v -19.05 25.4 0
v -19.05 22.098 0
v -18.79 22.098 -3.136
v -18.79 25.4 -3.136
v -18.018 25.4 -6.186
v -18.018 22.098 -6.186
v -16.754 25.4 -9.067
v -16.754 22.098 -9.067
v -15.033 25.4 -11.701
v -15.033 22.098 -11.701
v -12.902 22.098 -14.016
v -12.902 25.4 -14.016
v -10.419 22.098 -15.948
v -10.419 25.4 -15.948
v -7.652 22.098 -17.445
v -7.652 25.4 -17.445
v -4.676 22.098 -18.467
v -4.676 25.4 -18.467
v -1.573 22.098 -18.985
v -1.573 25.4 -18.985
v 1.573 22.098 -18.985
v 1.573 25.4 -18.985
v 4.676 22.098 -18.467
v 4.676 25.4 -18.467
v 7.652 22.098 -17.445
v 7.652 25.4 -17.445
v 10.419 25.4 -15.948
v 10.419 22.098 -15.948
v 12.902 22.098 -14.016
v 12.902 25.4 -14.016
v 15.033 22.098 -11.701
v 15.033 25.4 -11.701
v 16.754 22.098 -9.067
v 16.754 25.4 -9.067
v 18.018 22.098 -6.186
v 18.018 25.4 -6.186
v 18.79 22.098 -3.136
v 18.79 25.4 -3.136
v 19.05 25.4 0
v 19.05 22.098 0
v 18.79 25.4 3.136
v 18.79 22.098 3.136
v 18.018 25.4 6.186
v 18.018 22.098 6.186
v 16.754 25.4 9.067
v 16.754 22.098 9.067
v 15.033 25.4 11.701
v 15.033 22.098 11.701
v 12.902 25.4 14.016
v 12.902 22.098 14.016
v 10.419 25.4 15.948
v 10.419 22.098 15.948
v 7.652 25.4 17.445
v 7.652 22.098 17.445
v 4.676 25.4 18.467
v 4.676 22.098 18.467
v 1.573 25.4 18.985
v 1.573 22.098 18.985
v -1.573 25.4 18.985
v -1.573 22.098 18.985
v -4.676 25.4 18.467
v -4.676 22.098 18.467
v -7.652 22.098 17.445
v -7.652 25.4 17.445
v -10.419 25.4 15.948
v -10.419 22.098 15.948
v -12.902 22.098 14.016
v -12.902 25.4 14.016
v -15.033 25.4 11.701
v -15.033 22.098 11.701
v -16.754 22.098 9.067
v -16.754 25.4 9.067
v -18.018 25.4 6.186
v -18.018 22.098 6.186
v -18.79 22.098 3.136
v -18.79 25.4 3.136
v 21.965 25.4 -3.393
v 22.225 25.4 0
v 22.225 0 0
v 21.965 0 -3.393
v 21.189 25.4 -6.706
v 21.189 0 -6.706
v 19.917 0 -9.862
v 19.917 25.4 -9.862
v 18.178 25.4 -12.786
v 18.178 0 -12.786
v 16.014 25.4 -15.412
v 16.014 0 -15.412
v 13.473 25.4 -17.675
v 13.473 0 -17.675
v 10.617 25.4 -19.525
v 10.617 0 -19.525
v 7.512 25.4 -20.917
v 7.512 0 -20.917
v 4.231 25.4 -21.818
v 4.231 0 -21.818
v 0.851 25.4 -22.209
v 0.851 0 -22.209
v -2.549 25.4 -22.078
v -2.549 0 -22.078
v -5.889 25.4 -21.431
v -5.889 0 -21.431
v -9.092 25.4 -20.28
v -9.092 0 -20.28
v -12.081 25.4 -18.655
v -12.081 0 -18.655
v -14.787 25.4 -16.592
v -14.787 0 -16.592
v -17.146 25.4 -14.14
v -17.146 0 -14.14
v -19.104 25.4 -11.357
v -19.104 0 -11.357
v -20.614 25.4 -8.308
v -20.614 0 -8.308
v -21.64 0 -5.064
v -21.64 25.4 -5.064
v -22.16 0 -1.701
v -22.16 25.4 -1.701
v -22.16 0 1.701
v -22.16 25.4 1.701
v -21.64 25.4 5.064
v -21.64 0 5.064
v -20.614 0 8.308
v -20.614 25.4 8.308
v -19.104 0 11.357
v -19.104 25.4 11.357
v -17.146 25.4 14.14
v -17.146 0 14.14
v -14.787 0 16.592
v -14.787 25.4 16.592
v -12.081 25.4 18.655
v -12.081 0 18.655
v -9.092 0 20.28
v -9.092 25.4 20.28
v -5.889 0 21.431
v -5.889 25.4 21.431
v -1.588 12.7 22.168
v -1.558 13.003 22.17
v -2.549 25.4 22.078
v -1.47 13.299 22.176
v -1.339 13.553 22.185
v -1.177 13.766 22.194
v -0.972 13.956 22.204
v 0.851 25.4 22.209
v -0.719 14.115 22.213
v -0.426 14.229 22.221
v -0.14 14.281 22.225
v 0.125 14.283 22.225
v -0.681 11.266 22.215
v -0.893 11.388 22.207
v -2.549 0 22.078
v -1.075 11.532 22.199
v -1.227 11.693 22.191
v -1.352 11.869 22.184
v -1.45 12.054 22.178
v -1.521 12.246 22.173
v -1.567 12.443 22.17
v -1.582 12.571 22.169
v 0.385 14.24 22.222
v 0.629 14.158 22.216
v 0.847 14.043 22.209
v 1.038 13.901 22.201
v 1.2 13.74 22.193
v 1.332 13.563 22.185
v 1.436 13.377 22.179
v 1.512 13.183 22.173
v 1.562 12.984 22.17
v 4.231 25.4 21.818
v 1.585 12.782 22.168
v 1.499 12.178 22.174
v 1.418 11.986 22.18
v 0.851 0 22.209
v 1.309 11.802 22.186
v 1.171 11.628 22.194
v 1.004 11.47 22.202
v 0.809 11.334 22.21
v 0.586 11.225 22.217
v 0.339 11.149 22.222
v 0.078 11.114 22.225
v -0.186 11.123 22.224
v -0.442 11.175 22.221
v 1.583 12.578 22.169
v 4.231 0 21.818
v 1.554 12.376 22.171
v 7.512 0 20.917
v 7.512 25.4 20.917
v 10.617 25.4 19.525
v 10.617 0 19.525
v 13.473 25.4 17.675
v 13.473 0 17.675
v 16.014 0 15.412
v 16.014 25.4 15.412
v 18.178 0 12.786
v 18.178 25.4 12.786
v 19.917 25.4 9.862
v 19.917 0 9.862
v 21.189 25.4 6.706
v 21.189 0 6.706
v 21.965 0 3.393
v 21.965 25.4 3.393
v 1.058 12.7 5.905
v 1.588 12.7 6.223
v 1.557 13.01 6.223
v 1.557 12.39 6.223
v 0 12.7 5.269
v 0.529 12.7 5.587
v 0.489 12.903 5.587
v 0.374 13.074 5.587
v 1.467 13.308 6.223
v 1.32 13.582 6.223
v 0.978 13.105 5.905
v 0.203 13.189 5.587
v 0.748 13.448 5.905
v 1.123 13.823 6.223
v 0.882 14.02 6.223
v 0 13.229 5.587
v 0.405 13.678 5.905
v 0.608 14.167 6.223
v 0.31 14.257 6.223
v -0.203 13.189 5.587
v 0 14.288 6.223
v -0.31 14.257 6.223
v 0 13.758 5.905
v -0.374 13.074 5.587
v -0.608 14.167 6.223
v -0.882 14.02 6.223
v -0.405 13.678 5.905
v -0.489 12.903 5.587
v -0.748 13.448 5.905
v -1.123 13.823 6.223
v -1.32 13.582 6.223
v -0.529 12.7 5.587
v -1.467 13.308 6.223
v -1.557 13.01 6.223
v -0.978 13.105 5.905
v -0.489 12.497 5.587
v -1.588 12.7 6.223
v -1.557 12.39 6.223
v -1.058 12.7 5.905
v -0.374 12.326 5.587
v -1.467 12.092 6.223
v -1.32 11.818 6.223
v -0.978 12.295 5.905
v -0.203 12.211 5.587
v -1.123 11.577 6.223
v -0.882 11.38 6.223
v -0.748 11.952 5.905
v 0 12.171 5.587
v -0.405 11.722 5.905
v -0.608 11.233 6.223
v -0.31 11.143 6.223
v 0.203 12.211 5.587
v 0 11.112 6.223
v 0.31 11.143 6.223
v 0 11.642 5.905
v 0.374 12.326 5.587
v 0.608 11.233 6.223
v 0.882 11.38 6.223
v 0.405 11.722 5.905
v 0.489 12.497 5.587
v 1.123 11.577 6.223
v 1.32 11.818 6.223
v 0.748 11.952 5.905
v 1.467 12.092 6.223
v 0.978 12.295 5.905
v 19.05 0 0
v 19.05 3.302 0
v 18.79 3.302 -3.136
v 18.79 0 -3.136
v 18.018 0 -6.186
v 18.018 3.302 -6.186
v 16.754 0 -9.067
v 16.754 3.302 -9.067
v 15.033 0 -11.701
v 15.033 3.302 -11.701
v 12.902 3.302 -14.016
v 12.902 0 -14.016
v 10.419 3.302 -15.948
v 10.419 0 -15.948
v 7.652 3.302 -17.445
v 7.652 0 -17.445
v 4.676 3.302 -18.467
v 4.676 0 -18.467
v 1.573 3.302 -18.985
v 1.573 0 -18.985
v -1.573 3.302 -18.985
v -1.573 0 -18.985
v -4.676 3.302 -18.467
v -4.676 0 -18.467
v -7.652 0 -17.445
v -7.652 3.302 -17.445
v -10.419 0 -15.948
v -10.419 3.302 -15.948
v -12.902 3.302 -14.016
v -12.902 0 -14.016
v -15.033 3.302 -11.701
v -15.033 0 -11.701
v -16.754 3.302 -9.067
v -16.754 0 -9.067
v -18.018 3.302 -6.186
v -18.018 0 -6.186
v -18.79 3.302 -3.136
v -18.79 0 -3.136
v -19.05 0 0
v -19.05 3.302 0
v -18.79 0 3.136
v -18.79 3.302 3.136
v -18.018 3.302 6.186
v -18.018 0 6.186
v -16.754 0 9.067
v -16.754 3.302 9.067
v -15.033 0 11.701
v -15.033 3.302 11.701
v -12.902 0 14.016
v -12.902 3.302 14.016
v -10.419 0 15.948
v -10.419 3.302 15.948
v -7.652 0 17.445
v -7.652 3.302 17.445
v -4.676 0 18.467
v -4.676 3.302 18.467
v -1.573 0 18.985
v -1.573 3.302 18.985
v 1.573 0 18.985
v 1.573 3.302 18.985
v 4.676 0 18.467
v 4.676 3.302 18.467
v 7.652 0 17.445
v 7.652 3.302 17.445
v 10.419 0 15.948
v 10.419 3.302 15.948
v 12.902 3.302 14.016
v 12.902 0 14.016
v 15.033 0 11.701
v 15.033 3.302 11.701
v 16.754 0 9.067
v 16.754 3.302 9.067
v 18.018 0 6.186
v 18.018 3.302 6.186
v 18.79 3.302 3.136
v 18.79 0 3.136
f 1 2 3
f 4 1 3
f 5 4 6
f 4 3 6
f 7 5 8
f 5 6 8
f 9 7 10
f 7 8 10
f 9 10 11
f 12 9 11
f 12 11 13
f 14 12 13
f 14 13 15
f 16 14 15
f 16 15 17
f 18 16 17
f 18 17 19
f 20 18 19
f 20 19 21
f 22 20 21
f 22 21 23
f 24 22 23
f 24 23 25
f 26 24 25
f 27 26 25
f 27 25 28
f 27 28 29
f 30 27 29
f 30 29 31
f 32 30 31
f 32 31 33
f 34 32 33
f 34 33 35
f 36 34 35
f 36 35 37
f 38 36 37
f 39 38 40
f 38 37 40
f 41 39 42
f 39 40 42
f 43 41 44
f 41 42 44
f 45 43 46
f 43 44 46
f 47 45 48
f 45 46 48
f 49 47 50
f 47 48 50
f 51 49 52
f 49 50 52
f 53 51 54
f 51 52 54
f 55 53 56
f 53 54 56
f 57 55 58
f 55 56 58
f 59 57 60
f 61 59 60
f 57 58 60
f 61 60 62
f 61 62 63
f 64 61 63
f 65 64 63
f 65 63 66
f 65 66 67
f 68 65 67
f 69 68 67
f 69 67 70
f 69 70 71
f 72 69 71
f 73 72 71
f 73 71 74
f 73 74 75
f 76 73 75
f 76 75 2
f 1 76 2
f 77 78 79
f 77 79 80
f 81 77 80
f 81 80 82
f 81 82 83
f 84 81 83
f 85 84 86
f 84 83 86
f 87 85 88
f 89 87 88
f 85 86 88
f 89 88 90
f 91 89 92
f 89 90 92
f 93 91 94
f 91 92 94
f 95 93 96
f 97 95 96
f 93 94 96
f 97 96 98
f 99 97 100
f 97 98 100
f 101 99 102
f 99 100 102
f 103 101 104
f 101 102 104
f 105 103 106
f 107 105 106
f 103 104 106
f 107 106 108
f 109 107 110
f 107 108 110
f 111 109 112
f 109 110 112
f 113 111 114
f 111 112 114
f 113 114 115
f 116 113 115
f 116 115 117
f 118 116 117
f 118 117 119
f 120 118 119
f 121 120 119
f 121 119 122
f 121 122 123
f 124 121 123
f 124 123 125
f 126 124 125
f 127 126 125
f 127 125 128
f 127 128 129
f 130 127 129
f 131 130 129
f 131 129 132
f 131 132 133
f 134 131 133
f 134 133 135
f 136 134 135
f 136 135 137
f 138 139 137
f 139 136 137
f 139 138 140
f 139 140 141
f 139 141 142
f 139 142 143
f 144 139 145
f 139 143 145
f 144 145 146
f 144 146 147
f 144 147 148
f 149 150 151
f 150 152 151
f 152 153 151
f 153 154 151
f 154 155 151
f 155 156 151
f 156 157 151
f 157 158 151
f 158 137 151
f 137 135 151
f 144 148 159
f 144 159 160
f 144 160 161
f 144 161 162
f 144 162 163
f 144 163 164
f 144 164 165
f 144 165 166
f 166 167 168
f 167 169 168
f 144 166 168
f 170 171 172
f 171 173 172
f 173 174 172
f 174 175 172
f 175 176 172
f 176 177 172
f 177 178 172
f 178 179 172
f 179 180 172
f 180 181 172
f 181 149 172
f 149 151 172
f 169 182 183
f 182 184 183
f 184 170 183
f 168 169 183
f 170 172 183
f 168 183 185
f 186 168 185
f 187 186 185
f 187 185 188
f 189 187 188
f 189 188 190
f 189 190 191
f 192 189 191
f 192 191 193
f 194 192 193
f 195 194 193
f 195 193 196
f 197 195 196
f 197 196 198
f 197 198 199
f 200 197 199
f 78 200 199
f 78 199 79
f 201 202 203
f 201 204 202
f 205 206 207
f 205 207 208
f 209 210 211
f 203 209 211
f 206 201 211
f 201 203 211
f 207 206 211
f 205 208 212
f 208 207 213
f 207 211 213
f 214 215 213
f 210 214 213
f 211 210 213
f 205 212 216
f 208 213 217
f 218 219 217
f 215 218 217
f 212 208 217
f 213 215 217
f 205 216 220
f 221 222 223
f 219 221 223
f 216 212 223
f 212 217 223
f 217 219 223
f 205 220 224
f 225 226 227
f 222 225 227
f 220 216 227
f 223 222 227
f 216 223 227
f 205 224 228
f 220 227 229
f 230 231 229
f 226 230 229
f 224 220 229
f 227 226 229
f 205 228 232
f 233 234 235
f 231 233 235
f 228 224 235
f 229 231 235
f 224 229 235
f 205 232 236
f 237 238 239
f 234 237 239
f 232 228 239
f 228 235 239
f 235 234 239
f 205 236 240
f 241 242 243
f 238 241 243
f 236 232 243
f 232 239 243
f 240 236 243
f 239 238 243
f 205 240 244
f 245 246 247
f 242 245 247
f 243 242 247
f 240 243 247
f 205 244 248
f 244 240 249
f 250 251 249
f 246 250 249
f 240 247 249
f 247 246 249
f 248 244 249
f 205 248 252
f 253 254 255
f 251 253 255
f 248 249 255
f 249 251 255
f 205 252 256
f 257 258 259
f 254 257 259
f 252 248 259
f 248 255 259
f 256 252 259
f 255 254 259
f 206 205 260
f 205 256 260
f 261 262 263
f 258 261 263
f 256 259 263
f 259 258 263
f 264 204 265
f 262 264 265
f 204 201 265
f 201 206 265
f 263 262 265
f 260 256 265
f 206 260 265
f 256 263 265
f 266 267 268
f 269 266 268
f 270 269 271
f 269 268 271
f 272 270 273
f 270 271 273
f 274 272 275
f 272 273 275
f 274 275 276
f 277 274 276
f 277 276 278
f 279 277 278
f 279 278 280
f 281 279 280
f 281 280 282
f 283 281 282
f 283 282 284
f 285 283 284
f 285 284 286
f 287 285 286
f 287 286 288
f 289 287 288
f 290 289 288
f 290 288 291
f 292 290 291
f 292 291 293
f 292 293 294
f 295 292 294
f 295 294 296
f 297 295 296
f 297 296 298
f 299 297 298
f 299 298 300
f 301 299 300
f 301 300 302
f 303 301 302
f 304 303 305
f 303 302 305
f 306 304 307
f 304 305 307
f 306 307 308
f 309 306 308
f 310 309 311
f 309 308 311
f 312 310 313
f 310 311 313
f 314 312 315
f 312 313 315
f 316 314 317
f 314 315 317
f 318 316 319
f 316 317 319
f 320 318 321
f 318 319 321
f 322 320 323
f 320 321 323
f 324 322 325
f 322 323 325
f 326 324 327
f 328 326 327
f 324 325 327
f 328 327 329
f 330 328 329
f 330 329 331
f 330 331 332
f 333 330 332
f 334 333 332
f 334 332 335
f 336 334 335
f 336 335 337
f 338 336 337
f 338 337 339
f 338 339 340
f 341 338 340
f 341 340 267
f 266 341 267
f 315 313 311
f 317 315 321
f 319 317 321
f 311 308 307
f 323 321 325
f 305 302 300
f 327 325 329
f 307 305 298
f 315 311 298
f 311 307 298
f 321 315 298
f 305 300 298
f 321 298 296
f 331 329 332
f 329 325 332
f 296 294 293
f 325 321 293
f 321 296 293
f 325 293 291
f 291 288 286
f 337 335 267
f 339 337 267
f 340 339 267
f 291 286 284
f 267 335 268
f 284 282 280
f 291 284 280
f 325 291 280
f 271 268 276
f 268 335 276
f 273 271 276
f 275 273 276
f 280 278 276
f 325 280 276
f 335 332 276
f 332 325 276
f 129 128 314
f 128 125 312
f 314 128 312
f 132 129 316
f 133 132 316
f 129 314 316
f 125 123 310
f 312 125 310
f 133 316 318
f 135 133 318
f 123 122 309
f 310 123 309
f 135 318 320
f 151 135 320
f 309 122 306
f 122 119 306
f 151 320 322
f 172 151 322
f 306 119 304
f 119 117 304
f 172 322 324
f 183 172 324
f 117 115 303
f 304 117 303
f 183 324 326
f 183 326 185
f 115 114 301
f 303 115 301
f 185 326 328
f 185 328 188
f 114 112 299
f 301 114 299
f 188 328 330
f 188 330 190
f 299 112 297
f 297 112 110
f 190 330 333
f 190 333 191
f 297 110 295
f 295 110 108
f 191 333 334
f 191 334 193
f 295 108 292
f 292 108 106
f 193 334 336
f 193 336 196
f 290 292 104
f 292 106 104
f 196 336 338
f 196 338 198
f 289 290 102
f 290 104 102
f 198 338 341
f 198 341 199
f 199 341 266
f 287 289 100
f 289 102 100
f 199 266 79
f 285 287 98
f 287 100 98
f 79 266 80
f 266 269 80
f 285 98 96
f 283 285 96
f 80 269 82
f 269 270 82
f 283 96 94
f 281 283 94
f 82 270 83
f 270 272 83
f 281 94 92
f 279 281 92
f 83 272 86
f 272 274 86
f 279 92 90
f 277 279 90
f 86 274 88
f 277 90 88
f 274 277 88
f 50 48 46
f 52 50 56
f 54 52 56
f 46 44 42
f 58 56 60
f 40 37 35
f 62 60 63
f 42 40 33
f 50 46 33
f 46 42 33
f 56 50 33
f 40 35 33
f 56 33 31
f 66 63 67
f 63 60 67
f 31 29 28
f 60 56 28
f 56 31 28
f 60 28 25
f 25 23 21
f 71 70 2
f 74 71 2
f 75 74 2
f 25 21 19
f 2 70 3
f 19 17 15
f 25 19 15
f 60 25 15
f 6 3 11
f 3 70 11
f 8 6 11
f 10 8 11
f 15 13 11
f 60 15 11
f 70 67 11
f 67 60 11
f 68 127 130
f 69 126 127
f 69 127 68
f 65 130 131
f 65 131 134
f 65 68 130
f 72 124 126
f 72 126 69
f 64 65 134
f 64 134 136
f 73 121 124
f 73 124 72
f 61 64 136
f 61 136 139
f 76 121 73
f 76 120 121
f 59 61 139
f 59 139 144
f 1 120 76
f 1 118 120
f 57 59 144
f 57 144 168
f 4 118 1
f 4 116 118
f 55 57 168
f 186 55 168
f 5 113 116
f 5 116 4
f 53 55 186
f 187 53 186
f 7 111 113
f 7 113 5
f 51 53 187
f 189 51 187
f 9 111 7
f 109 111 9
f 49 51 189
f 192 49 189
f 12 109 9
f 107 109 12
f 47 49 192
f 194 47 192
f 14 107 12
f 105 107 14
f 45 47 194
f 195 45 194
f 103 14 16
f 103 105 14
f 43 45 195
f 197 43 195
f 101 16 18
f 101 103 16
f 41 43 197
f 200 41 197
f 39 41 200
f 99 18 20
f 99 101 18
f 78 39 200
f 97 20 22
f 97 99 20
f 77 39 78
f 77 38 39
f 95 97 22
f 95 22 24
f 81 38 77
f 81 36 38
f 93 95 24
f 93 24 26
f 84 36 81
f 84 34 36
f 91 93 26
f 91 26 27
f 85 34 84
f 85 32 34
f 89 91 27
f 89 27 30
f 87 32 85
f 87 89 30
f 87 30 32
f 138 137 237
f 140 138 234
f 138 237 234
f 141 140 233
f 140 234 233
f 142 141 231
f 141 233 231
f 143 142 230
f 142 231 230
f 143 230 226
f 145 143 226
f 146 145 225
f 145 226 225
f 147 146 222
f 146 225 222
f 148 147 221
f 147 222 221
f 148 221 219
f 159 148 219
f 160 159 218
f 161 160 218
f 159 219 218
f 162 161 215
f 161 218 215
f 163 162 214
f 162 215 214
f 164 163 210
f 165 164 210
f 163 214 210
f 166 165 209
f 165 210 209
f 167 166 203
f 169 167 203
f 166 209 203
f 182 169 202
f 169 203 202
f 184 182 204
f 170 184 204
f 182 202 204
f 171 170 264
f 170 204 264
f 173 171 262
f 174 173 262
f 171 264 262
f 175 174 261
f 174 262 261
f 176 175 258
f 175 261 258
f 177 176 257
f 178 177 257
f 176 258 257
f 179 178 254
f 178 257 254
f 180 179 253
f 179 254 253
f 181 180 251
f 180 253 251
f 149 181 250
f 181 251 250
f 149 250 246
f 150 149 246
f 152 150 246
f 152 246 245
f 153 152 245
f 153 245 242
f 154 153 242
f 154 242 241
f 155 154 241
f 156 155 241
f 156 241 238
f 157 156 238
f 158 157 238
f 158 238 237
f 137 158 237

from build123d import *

# Parameters (mm, degrees)
SKETCH2_R                        = 22.225
BOSS_EXTRUDE1_DEPTH              = 25.4
F_1_4_1_5_DIAMETER_HOLE1_D       = 38.1
F_1_4_1_5_DIAMETER_HOLE1_DEPTH   = 3.302
F_1_4_1_5_DIAMETER_HOLE2_D       = 38.1
F_1_4_1_5_DIAMETER_HOLE2_DEPTH   = 3.302
F_1_4_0_125_DIAMETER_HOLE1_D     = 3.175
F_1_4_0_125_DIAMETER_HOLE1_DEPTH = 16.002
F_1_4_0_125_DIAMETER_HOLE1_TIP   = 0.953866233


with BuildPart() as part:
    # Sketch2 → Boss-Extrude1 (new body)
    with BuildSketch(Plane(origin=(0, 0, 0), x_dir=(1, 0, 0), z_dir=(0, 1, 0))):
        Circle(SKETCH2_R)
    extrude(amount=BOSS_EXTRUDE1_DEPTH)

    # 1/4 (1.5) Diameter Hole1
    with Locations(Plane(origin=(0, 25.4, 0), x_dir=(1, 0, 0), z_dir=(0, 1, 0))):
        with Locations((0, 0)):
            Hole(F_1_4_1_5_DIAMETER_HOLE1_D / 2, depth=F_1_4_1_5_DIAMETER_HOLE1_DEPTH)

    # 1/4 (1.5) Diameter Hole2
    with Locations(Plane(origin=(0, 0, 0), x_dir=(-1, 0, 0), z_dir=(0, -1, 0))):
        with Locations((0, 0)):
            Hole(F_1_4_1_5_DIAMETER_HOLE2_D / 2, depth=F_1_4_1_5_DIAMETER_HOLE2_DEPTH)

    # 1/4 (0.125) Diameter Hole1
    with Locations(Plane.XY.offset(22.225)):
        with Locations((0, 12.7)):
            Hole(F_1_4_0_125_DIAMETER_HOLE1_D / 2, depth=F_1_4_0_125_DIAMETER_HOLE1_DEPTH)
            with Locations((0, 0, -(F_1_4_0_125_DIAMETER_HOLE1_DEPTH + F_1_4_0_125_DIAMETER_HOLE1_TIP / 2))):  # 118° drill point
                Cone(0, F_1_4_0_125_DIAMETER_HOLE1_D / 2, F_1_4_0_125_DIAMETER_HOLE1_TIP, mode=Mode.SUBTRACT)


solid = part.part
